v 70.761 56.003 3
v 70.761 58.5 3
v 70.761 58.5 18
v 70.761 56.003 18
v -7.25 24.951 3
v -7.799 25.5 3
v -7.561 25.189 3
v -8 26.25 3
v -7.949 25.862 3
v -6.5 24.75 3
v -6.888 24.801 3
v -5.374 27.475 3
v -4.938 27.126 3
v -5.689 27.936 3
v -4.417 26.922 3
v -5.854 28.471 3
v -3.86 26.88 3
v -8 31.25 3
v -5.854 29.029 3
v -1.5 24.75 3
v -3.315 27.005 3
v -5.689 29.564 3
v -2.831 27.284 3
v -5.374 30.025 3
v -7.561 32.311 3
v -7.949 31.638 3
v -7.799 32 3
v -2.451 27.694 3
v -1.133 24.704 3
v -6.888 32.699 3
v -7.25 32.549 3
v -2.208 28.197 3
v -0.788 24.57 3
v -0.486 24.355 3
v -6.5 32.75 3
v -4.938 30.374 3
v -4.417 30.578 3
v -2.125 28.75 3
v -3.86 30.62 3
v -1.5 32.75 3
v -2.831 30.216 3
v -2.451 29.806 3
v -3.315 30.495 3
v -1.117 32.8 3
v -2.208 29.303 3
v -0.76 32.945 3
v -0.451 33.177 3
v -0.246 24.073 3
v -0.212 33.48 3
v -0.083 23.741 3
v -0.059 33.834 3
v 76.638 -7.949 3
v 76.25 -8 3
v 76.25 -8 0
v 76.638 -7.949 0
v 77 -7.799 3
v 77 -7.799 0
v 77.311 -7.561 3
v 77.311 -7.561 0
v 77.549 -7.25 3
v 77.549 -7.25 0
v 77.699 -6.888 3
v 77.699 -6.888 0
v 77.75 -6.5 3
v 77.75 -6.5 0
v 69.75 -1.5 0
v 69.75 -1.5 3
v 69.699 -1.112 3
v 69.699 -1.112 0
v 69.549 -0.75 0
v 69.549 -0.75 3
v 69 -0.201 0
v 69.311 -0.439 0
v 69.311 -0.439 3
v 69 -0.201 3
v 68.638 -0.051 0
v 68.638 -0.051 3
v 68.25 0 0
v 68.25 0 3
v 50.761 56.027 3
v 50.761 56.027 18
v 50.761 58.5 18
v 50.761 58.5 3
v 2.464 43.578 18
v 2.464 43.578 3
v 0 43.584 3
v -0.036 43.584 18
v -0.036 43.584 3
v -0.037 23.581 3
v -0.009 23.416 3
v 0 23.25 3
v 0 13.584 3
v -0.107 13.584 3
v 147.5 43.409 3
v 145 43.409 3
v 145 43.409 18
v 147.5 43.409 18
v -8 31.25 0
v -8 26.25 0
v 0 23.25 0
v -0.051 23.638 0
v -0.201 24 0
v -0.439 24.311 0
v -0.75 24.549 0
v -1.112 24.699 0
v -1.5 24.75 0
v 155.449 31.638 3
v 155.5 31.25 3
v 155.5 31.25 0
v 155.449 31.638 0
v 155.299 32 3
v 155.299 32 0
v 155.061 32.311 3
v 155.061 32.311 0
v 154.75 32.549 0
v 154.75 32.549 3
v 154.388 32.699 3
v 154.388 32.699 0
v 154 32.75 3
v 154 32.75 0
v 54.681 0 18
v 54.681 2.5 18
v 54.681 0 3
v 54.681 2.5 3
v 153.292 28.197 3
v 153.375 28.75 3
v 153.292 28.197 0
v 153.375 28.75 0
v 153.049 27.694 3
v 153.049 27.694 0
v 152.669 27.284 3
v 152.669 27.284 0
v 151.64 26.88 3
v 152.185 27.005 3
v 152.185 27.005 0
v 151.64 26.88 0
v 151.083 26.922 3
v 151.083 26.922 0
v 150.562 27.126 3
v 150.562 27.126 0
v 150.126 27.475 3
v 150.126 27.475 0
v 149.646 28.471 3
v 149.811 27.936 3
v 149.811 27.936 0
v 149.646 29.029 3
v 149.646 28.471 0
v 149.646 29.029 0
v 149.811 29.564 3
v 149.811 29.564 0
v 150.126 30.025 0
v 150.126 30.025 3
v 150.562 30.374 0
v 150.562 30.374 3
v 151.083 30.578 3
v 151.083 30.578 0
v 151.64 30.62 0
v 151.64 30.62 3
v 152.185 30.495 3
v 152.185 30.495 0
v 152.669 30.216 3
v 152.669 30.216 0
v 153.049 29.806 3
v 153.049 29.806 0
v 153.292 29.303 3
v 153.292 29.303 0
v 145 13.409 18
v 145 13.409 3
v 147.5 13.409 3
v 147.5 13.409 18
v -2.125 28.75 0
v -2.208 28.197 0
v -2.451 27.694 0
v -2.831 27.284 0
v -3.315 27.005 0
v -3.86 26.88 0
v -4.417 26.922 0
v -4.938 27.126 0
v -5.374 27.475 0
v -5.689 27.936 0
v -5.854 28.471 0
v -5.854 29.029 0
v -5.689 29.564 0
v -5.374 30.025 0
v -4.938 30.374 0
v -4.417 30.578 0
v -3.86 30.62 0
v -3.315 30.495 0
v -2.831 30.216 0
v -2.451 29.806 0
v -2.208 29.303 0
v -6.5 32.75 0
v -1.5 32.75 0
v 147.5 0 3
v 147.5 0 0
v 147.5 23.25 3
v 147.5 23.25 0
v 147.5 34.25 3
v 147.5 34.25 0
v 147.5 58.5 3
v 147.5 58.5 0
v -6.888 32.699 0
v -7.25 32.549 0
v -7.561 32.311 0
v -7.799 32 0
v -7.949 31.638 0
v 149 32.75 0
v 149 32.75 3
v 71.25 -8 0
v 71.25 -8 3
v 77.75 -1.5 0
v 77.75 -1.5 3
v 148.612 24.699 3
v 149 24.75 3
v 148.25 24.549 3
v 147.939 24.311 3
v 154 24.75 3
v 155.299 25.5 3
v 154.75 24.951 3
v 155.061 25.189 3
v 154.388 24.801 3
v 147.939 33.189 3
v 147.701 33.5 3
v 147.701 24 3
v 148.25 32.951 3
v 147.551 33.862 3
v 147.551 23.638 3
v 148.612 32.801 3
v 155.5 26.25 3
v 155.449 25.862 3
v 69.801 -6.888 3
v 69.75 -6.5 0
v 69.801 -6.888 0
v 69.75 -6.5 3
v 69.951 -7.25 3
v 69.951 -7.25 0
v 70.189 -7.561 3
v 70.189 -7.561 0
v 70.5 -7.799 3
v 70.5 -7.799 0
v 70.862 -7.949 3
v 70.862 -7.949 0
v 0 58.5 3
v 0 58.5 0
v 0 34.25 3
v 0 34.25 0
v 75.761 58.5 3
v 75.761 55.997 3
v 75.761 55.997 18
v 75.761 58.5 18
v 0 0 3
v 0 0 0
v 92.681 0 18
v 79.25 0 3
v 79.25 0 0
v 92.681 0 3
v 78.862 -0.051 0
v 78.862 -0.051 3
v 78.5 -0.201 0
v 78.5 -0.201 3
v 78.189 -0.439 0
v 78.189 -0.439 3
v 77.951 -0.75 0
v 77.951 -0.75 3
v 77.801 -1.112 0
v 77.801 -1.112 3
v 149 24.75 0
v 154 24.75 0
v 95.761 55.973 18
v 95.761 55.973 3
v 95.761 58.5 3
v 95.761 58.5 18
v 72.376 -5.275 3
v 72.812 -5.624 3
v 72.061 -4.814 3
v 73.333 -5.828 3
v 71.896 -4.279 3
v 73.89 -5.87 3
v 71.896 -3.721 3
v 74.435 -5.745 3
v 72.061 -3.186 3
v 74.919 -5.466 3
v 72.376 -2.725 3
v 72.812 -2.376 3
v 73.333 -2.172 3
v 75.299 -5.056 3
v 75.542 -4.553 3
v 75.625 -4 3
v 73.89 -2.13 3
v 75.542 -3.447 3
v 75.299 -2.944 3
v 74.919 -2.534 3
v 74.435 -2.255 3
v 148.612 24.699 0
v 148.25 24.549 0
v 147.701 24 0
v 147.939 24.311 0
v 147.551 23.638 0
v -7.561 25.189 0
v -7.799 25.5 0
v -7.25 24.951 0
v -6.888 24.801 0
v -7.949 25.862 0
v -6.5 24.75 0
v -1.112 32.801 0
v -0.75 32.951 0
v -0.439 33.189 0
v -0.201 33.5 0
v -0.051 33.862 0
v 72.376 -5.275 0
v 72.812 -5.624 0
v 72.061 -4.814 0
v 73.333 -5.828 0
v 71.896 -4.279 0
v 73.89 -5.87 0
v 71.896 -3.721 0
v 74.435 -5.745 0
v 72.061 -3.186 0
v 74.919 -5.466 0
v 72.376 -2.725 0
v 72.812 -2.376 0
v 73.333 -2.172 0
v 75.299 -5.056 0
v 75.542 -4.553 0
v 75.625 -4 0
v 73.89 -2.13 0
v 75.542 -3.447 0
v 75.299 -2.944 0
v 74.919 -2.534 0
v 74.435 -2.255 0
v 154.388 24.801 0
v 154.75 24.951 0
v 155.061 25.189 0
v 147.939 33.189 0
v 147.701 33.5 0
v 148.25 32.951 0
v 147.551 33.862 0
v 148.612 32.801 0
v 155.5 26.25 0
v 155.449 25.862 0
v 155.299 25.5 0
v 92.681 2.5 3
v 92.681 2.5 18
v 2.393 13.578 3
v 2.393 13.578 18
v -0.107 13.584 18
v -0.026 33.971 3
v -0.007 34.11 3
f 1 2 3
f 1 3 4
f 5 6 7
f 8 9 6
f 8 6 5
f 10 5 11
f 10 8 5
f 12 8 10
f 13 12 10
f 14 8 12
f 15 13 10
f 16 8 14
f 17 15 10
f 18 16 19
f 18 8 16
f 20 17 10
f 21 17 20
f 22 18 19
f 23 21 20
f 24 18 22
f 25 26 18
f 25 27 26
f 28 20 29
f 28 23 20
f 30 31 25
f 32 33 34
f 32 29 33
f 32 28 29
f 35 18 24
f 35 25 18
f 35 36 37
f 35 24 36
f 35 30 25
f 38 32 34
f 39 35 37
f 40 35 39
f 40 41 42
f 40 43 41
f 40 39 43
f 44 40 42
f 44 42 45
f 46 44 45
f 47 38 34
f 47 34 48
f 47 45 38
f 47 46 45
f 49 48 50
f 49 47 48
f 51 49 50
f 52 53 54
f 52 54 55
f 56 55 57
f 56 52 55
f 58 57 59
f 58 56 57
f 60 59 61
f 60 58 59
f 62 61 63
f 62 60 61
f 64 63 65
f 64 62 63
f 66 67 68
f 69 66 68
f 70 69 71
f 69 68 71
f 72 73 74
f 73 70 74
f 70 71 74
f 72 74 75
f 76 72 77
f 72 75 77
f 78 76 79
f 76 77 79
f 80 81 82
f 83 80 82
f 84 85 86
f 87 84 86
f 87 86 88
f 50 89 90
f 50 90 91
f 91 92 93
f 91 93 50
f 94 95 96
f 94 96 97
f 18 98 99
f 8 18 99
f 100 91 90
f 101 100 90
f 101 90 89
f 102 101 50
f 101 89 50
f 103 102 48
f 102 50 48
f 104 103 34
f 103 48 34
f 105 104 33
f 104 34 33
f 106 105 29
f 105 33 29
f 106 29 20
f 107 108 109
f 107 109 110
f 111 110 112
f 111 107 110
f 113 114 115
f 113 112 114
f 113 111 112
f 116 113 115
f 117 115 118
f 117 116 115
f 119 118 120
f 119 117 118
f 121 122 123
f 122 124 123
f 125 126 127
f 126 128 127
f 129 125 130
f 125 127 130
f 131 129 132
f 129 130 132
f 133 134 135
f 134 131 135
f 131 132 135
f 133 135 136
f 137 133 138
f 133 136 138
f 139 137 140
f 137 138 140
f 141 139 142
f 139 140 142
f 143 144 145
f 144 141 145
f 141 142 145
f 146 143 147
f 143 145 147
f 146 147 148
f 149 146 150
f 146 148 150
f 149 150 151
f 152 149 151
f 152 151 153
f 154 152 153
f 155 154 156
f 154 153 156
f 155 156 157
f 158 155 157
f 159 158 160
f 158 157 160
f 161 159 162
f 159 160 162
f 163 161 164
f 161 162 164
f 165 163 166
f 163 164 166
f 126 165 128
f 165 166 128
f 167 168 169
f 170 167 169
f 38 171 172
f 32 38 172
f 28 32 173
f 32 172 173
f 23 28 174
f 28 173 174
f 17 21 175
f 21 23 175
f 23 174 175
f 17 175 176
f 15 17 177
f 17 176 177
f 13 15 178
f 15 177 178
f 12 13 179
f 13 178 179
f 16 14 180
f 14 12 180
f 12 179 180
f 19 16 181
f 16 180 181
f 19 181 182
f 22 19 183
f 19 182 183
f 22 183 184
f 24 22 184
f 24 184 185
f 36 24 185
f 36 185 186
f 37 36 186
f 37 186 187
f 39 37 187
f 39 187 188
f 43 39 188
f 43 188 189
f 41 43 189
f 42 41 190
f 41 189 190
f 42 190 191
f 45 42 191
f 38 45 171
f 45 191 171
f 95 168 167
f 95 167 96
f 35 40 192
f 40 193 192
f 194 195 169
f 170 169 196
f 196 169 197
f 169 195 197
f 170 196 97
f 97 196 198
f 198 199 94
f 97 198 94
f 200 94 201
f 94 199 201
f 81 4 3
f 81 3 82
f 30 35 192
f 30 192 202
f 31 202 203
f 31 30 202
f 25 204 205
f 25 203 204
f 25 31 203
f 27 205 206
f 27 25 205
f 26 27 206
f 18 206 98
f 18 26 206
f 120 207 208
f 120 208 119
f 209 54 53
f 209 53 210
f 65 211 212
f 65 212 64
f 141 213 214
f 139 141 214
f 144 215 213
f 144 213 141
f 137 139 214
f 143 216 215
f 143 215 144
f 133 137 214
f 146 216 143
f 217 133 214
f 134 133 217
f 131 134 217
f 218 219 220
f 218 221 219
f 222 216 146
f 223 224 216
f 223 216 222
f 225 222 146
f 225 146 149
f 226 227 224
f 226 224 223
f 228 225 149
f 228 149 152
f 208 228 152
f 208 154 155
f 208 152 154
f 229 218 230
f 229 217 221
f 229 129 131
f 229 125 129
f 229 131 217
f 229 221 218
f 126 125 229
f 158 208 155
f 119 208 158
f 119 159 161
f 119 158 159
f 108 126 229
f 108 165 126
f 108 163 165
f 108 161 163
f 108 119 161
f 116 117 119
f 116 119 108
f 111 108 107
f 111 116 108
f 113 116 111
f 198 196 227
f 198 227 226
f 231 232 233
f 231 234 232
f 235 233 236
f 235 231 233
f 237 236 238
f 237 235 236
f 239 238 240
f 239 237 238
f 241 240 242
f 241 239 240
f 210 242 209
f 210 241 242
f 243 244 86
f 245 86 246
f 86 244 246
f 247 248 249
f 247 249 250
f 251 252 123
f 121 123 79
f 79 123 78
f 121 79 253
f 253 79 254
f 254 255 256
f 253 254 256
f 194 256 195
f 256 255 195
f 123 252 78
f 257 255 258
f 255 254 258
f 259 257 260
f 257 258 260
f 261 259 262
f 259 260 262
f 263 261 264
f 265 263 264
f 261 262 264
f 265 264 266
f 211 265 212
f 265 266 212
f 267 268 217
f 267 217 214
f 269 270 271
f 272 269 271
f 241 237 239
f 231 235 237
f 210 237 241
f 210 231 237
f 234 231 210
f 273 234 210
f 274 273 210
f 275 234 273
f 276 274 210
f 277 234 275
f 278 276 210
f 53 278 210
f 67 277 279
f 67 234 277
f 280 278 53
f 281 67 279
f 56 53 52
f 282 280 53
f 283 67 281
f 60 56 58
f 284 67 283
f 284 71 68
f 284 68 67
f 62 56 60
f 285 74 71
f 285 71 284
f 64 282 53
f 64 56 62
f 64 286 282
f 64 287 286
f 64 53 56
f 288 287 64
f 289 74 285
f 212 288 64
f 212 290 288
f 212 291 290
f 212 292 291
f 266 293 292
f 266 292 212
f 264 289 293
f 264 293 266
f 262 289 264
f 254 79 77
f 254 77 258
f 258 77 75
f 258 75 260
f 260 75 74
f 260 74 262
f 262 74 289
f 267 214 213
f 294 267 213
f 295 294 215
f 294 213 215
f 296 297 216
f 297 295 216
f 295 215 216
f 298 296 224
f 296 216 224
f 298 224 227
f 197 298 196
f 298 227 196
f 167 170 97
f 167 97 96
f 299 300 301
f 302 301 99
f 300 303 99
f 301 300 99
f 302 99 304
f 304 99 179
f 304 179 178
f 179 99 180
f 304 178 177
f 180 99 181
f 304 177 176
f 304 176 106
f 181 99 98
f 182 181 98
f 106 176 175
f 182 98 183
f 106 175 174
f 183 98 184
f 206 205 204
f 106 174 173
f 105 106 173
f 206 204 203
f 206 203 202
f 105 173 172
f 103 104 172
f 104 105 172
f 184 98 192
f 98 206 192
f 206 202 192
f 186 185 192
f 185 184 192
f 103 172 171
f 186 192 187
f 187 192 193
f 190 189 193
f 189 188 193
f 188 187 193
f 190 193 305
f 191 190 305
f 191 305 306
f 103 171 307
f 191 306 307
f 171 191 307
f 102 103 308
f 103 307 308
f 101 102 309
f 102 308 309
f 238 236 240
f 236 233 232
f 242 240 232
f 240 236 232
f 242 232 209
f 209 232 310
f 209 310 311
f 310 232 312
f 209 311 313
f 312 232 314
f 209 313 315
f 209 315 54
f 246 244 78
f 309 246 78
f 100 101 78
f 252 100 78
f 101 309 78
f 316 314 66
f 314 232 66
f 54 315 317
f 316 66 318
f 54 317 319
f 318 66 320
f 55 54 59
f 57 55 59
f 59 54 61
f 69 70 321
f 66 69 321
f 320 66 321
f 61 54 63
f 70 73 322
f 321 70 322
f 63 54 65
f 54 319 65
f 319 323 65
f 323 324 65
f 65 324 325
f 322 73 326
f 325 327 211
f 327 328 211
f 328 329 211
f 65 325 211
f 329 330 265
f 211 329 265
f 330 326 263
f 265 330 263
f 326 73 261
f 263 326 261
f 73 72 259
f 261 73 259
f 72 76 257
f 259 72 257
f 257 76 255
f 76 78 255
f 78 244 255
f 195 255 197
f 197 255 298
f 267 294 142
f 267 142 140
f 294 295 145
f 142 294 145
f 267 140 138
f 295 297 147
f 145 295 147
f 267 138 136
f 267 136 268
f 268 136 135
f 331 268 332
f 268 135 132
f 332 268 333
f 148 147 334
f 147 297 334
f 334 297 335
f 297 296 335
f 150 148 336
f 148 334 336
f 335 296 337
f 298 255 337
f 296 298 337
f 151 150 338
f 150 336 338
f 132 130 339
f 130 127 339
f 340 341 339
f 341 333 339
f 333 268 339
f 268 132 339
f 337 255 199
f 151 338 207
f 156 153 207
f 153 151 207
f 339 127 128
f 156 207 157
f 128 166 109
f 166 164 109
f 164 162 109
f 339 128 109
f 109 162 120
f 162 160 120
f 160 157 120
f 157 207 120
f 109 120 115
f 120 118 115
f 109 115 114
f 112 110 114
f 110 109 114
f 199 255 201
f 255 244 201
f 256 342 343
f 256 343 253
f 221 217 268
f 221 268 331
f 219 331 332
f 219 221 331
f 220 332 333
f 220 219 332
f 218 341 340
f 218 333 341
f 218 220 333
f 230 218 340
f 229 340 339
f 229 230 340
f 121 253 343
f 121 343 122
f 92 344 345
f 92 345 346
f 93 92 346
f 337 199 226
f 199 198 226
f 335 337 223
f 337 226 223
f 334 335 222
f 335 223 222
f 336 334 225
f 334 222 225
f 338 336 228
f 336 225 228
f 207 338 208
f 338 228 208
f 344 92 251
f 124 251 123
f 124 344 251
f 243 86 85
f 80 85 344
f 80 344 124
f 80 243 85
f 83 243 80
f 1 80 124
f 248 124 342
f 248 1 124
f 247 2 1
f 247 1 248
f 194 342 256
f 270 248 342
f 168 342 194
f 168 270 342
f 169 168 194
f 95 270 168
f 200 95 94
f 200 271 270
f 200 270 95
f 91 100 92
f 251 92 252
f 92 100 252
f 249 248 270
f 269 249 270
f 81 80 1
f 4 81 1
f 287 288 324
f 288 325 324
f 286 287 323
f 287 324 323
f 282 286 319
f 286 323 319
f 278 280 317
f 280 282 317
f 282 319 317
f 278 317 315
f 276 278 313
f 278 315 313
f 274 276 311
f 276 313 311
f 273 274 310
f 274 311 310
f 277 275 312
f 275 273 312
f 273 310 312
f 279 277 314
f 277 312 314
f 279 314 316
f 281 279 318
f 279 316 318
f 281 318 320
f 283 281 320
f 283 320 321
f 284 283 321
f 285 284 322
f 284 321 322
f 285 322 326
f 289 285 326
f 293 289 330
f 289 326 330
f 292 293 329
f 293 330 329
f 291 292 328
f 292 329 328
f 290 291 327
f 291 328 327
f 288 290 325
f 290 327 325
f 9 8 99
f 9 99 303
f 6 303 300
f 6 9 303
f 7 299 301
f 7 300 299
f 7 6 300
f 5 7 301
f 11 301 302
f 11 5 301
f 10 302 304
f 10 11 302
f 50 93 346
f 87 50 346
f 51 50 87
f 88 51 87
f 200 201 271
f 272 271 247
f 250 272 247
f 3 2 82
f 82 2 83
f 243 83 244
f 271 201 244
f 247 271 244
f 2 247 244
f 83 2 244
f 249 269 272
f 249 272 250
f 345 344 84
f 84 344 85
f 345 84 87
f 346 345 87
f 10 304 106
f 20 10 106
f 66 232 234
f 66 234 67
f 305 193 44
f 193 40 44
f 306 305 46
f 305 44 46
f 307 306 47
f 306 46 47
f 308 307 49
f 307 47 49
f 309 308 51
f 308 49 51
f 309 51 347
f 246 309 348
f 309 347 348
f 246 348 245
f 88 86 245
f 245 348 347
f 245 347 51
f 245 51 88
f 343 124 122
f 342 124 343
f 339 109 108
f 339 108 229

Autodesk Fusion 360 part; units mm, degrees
sketch "Sketch2" plane through (0, 0, 0) normal (0, 0, 1) x (1, 0, 0)
  line L0 (0, 0) -> (147.5, 0)
  line L1 (147.5, 0) -> (147.5, 58.5)
  line L2 (147.5, 58.5) -> (0, 58.5)
  line L3 (0, 58.5) -> (0, 0)
  line L4 (69.75, 0) -> (77.75, 0)
  line L5 (77.75, 0) -> (77.75, -8)
  line L6 (77.75, -8) -> (69.75, -8)
  line L7 (69.75, -8) -> (69.75, 0)
  line L8 (147.5, 24.75) -> (147.5, 32.75)
  line L9 (147.5, 32.75) -> (155.5, 32.75)
  line L10 (155.5, 32.75) -> (155.5, 24.75)
  line L11 (155.5, 24.75) -> (147.5, 24.75)
  line L12 (73.75, 58.5) -> (73.75, 0) construction
  line L13 (147.5, 28.75) -> (155.5, 28.75) construction
  line L14 (151.5, 32.75) -> (151.5, 24.75) construction
  circle A0 centre (151.5, 28.75) radius 1.875
  line L15 (-8, 24.75) -> (0, 24.75)
  line L16 (-8, 32.75) -> (-8, 24.75)
  line L17 (0, 32.75) -> (-8, 32.75)
  circle A1 centre (-4, 28.75) radius 1.875
  line L18 (69.75, -4) -> (77.75, -4) construction
  line L19 (73.75, 0) -> (73.75, -8) construction
  circle A2 centre (73.75, -4) radius 1.875
  point P0 (73.75, 0)
  point P1 (147.5, 28.75)
  point P2 (-8, 28.75)
  dimension "d8" = 147.5
  dimension "d9" = 58.5
  dimension "d12" = 8
  dimension "d13" = 8
  dimension "d14" = 8
  dimension "d15" = 8
  dimension "d16" = 8
  dimension "d17" = 3.75
  dimension "d18" = 3.75
extrude "Extrude1" add sketch "Sketch2" along normal blind 3
fillet "Fillet1" radius 1.5 12 edges at (77.75, 0, 1.5) (77.75, -8, 1.5) (69.75, -8, 1.5) (69.75, 0, 1.5) (0, 24.75, 1.5) (-8, 24.75, 1.5) (-8, 32.75, 1.5) (0, 32.75, 1.5) (155.5, 32.75, 1.5) (147.5, 32.75, 1.5) (147.5, 24.75, 1.5) (155.5, 24.75, 1.5)
sketch "Sketch3" plane through (0, 0, 3) normal (0, 0, 1) x (-1, 0, 0)
  arc A0 (-154, -24.75) -> (-155.5, -26.25) centre (-154, -26.25) ccw
  line L0 (-155.5, -26.25) -> (-155.5, -31.25)
  arc A1 (-155.5, -31.25) -> (-154, -32.75) centre (-154, -31.25) ccw
  line L1 (-154, -32.75) -> (-149, -32.75)
  arc A2 (-147.5, -34.25) -> (-149, -32.75) centre (-149, -34.25) ccw
  line L2 (-147.5, -34.25) -> (-147.5, -58.5)
  line L3 (-147.5, -58.5) -> (0, -58.5)
  line L4 (0, -58.5) -> (0, -34.25)
  arc A3 (1.5, -32.75) -> (0, -34.25) centre (1.5, -34.25) ccw
  line L5 (1.5, -32.75) -> (6.5, -32.75)
  arc A4 (6.5, -32.75) -> (8, -31.25) centre (6.5, -31.25) ccw
  line L6 (8, -31.25) -> (8, -26.25)
  arc A5 (8, -26.25) -> (6.5, -24.75) centre (6.5, -26.25) ccw
  line L7 (6.5, -24.75) -> (1.5, -24.75)
  arc A6 (0, -23.25) -> (1.5, -24.75) centre (1.5, -23.25) ccw
  line L8 (0, -23.25) -> (0, 0)
  line L9 (0, 0) -> (-68.25, 0)
  arc A7 (-69.75, 1.5) -> (-68.25, 0) centre (-68.25, 1.5) ccw
  line L10 (-69.75, 1.5) -> (-69.75, 6.5)
  arc A8 (-69.75, 6.5) -> (-71.25, 8) centre (-71.25, 6.5) ccw
  line L11 (-71.25, 8) -> (-76.25, 8)
  arc A9 (-76.25, 8) -> (-77.75, 6.5) centre (-76.25, 6.5) ccw
  line L12 (-77.75, 6.5) -> (-77.75, 1.5)
  arc A10 (-79.25, 0) -> (-77.75, 1.5) centre (-79.25, 1.5) ccw
  line L13 (-79.25, 0) -> (-147.5, 0)
  line L14 (-147.5, 0) -> (-147.5, -23.25)
  arc A11 (-149, -24.75) -> (-147.5, -23.25) centre (-149, -23.25) ccw
  line L15 (-149, -24.75) -> (-154, -24.75)
  circle A12 centre (-151.5, -28.75) radius 1.875
  circle A13 centre (4, -28.75) radius 1.875
  circle A14 centre (-73.75, 4) radius 1.875
  line L16 (0, -2.5) -> (-147.5, -2.5) construction
  line L17 (-54.6806, -2.5) -> (-92.6806, -2.5)
  line L18 (-92.6806, -2.5) -> (-92.6806, 0)
  line L19 (-54.6806, -2.5) -> (-54.6806, 0)
  line L20 (-54.6806, 0) -> (-92.6806, 0)
  line L21 (-145, -57) -> (-145, 0) construction
  line L22 (-145, -13.4089) -> (-145, -43.4089)
  line L23 (-145, -43.4089) -> (-147.5, -43.4089)
  line L24 (-145, -13.4089) -> (-147.5, -13.4089)
  line L25 (-147.5, -13.4089) -> (-147.5, -43.4089)
  line L26 (-73.75, -58.5) -> (-73.6806, 0) construction
  line L27 (-2.3933, -13.578) -> (0.1067, -13.5839)
  line L28 (0.1067, -13.5839) -> (0.0356, -43.5838)
  line L29 (-2.4644, -43.5779) -> (0.0356, -43.5838)
  line L30 (-2.3933, -13.578) -> (-2.4644, -43.5779)
  line L31 (0, -56) -> (-147.5, -56) construction
  line L32 (-50.7607, -56.0267) -> (-95.7606, -55.9733)
  line L33 (-95.7606, -55.9733) -> (-95.7606, -58.5)
  line L34 (-50.7607, -56.0267) -> (-50.7607, -58.5)
  line L35 (-50.7607, -58.5) -> (-95.7606, -58.5)
  line L36 (-70.7606, -56.003) -> (-75.7606, -55.997)
  line L37 (-75.7606, -55.997) -> (-75.7611, -58.5)
  line L38 (-75.7611, -58.5) -> (-70.7611, -58.5)
  line L39 (-70.7611, -58.5) -> (-70.7606, -56.003)
  point P0 (-73.6806, -2.5)
  point P1 (-145, -28.4089)
  point P2 (-73.2606, -56)
  point P3 (-73.2606, -56)
  dimension "d23" = 2.5
  dimension "d24" = 38
  dimension "d25" = 2.5
  dimension "d26" = 30
  dimension "d27" = 2.5
  dimension "d28" = 45
  dimension "d29" = 5
extrude "Extrude2" add sketch "Sketch3" along normal blind 15 contours L2 L14 L22 L23 L24 L25 | L9 L13 L17 L18 L19 L20 | L3 L32 L33 L35 L37 | L3 L32 L34 L35 L39 | A6 L8 L27 L28 | L4 A3 A6 L8 L27 L28 L29 L30 | L4 A3 L28 L29
equation "controller_length = 144 mm"
equation "controller_width = 55 mm"
equation "mount_hole_diameter = 3.5 mm"
equation "base_thickness = 3 mm"
equation "wall_thickness = 2.5 mm"
equation "give = 1 mm"
equation "d8 = total_length"
equation "d9 = total_width"
equation "total_length = controller_length + wall_thickness + give"
equation "total_width = controller_width + give + wall_thickness"
equation "d19 = base_thickness"
equation "d23 = wall_thickness"
equation "d25 = wall_thickness"
equation "d27 = wall_thickness"
equation "d30 = wall_height"
equation "wall_height = 15 mm"
